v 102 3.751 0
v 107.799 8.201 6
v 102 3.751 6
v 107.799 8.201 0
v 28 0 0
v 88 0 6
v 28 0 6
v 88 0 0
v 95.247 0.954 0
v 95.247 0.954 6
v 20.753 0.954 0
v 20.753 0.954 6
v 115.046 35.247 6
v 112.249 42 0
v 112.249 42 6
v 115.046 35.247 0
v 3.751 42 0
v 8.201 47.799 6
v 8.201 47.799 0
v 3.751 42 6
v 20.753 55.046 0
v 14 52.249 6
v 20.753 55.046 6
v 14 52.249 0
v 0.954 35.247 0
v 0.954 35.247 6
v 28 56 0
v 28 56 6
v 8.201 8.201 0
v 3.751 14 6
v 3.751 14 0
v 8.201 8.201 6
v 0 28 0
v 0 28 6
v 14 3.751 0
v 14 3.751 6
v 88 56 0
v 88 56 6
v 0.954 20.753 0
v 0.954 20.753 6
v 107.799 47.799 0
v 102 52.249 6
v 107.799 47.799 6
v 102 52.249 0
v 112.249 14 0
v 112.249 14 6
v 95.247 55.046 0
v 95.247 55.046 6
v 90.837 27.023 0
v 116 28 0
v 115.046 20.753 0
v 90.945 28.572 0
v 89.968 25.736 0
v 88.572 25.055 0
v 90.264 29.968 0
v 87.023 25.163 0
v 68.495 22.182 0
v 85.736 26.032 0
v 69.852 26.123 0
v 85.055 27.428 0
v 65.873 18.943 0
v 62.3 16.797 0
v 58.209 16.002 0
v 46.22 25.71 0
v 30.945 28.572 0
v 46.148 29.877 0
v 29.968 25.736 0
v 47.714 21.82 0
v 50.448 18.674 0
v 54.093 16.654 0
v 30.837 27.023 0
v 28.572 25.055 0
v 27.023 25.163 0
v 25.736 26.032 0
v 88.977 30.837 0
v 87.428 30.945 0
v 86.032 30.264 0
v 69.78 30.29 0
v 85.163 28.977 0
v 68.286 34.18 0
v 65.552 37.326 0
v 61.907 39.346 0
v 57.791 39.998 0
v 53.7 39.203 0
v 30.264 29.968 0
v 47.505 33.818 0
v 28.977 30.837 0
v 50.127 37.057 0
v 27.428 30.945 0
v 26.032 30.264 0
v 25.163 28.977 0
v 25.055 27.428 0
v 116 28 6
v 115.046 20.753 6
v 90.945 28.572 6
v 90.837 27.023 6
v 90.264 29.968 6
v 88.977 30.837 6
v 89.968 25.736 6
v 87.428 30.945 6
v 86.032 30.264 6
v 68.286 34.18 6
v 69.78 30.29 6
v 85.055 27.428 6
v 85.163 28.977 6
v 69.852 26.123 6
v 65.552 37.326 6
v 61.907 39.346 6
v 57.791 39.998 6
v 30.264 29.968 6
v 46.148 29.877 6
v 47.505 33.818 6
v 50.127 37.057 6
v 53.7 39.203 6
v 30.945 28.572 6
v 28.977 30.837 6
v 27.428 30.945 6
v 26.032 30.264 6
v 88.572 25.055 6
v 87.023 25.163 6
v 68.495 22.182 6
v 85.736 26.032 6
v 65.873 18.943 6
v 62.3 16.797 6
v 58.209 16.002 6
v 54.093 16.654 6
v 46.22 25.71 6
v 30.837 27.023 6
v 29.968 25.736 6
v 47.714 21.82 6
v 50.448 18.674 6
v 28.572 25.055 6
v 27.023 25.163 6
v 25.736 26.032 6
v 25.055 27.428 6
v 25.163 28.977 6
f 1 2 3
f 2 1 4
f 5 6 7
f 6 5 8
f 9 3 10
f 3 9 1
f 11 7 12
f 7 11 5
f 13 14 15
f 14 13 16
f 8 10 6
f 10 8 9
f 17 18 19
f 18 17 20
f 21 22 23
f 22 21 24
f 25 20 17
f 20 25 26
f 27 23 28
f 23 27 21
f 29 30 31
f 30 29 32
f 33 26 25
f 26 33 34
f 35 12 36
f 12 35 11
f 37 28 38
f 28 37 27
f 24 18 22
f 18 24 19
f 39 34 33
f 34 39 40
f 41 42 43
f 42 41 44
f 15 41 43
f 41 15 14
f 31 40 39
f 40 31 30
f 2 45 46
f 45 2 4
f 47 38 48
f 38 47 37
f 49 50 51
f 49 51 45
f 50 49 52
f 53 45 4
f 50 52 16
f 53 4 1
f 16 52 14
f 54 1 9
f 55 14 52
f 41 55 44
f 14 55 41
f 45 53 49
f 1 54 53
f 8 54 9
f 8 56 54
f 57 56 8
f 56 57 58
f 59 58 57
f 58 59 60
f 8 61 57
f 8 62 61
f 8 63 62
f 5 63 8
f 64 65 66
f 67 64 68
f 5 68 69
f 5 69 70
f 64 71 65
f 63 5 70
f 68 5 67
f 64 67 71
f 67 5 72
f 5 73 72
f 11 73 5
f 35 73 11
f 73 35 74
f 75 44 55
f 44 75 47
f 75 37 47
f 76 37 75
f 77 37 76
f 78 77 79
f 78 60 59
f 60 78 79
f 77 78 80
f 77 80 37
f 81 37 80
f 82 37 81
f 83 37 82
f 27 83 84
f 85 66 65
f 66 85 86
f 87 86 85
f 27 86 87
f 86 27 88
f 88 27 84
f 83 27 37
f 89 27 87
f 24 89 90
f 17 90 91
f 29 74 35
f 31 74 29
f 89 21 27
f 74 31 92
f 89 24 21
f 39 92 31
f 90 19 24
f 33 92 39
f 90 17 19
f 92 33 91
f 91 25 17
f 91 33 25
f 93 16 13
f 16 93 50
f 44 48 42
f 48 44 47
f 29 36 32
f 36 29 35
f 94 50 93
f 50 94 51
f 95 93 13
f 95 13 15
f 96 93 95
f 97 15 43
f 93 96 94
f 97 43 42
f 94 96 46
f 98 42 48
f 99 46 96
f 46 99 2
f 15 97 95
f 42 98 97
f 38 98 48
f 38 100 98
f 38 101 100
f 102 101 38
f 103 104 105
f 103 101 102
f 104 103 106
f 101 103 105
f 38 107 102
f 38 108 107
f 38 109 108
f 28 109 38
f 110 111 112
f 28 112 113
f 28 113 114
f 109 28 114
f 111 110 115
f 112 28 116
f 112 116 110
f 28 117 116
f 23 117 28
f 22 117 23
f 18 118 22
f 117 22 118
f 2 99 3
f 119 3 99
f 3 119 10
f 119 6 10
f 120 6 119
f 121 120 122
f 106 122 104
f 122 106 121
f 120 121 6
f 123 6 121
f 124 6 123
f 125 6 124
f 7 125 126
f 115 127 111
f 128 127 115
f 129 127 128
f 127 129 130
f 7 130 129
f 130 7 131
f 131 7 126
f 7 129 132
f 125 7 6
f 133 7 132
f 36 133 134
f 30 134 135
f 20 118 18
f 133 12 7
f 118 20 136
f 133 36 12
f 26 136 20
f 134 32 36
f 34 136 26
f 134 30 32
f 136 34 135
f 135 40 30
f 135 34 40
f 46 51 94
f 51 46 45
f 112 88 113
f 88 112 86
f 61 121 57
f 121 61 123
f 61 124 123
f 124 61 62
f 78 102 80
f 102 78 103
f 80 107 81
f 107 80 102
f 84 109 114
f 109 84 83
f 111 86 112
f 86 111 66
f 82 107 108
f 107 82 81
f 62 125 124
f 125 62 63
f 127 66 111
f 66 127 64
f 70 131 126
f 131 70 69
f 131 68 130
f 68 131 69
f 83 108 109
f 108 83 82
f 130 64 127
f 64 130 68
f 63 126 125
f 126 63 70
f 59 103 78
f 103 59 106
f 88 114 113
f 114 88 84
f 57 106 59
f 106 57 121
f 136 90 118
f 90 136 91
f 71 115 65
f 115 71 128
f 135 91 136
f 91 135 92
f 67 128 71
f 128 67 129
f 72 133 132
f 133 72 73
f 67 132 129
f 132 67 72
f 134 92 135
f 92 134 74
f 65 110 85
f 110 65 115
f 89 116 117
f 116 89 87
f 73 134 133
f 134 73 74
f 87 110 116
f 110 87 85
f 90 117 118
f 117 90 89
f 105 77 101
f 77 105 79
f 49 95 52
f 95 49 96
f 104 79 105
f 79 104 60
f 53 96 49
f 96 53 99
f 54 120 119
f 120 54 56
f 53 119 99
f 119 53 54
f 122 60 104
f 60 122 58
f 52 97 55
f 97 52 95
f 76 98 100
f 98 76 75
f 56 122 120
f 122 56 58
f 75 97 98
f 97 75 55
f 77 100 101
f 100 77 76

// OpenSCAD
$fn = 32;

// ----------------------------------------------------------------------
// Spacer plate: obround span 60, caps R28
// ----------------------------------------------------------------------

// --- parameters (mm) ---
bore_r = 12;              // centre bore radius
bolt_r = 3;               // bolt hole radius
plate_t = 6;              // plate thickness, Z (extrusion height)
span = 60;                // obround span
cap_r = 28;               // cap radius

profile = [[28, 56], [20.753, 55.046], [14, 52.249], [8.201, 47.799], [3.751, 42], [0.954, 35.247], [0, 28], [0.954, 20.753], [3.751, 14], [8.201, 8.201], [14, 3.751], [20.753, 0.954], [28, 0], [88, 0], [95.247, 0.954], [102, 3.751], [107.799, 8.201], [112.249, 14], [115.046, 20.753], [116, 28], [115.046, 35.247], [112.249, 42], [107.799, 47.799], [102, 52.249], [95.247, 55.046], [88, 56]];  // primary outline, 26 points, counter clockwise
void_1 = [[69.78, 30.29], [68.286, 34.18], [65.552, 37.326], [61.907, 39.346], [57.791, 39.998], [53.7, 39.203], [50.127, 37.057], [47.505, 33.818], [46.148, 29.877], [46.22, 25.71], [47.714, 21.82], [50.448, 18.674], [54.093, 16.654], [58.209, 16.002], [62.3, 16.797], [65.873, 18.943], [68.495, 22.182], [69.852, 26.123]];  // centre bore, 18 points
void_2 = [[30.945, 28.572], [30.264, 29.968], [28.977, 30.837], [27.428, 30.945], [26.032, 30.264], [25.163, 28.977], [25.055, 27.428], [25.736, 26.032], [27.023, 25.163], [28.572, 25.055], [29.968, 25.736], [30.837, 27.023]];  // end hole, 12 points
void_3 = [[90.945, 28.572], [90.264, 29.968], [88.977, 30.837], [87.428, 30.945], [86.032, 30.264], [85.163, 28.977], [85.055, 27.428], [85.736, 26.032], [87.023, 25.163], [88.572, 25.055], [89.968, 25.736], [90.837, 27.023]];  // end hole, 12 points

// --- the one profile operation ---
difference() {
  linear_extrude(height = plate_t) polygon(points = profile);
  translate([0, 0, -1])
    linear_extrude(height = plate_t + 2) polygon(points = void_1);
  translate([0, 0, -1])
    linear_extrude(height = plate_t + 2) polygon(points = void_2);
  translate([0, 0, -1])
    linear_extrude(height = plate_t + 2) polygon(points = void_3);
}
